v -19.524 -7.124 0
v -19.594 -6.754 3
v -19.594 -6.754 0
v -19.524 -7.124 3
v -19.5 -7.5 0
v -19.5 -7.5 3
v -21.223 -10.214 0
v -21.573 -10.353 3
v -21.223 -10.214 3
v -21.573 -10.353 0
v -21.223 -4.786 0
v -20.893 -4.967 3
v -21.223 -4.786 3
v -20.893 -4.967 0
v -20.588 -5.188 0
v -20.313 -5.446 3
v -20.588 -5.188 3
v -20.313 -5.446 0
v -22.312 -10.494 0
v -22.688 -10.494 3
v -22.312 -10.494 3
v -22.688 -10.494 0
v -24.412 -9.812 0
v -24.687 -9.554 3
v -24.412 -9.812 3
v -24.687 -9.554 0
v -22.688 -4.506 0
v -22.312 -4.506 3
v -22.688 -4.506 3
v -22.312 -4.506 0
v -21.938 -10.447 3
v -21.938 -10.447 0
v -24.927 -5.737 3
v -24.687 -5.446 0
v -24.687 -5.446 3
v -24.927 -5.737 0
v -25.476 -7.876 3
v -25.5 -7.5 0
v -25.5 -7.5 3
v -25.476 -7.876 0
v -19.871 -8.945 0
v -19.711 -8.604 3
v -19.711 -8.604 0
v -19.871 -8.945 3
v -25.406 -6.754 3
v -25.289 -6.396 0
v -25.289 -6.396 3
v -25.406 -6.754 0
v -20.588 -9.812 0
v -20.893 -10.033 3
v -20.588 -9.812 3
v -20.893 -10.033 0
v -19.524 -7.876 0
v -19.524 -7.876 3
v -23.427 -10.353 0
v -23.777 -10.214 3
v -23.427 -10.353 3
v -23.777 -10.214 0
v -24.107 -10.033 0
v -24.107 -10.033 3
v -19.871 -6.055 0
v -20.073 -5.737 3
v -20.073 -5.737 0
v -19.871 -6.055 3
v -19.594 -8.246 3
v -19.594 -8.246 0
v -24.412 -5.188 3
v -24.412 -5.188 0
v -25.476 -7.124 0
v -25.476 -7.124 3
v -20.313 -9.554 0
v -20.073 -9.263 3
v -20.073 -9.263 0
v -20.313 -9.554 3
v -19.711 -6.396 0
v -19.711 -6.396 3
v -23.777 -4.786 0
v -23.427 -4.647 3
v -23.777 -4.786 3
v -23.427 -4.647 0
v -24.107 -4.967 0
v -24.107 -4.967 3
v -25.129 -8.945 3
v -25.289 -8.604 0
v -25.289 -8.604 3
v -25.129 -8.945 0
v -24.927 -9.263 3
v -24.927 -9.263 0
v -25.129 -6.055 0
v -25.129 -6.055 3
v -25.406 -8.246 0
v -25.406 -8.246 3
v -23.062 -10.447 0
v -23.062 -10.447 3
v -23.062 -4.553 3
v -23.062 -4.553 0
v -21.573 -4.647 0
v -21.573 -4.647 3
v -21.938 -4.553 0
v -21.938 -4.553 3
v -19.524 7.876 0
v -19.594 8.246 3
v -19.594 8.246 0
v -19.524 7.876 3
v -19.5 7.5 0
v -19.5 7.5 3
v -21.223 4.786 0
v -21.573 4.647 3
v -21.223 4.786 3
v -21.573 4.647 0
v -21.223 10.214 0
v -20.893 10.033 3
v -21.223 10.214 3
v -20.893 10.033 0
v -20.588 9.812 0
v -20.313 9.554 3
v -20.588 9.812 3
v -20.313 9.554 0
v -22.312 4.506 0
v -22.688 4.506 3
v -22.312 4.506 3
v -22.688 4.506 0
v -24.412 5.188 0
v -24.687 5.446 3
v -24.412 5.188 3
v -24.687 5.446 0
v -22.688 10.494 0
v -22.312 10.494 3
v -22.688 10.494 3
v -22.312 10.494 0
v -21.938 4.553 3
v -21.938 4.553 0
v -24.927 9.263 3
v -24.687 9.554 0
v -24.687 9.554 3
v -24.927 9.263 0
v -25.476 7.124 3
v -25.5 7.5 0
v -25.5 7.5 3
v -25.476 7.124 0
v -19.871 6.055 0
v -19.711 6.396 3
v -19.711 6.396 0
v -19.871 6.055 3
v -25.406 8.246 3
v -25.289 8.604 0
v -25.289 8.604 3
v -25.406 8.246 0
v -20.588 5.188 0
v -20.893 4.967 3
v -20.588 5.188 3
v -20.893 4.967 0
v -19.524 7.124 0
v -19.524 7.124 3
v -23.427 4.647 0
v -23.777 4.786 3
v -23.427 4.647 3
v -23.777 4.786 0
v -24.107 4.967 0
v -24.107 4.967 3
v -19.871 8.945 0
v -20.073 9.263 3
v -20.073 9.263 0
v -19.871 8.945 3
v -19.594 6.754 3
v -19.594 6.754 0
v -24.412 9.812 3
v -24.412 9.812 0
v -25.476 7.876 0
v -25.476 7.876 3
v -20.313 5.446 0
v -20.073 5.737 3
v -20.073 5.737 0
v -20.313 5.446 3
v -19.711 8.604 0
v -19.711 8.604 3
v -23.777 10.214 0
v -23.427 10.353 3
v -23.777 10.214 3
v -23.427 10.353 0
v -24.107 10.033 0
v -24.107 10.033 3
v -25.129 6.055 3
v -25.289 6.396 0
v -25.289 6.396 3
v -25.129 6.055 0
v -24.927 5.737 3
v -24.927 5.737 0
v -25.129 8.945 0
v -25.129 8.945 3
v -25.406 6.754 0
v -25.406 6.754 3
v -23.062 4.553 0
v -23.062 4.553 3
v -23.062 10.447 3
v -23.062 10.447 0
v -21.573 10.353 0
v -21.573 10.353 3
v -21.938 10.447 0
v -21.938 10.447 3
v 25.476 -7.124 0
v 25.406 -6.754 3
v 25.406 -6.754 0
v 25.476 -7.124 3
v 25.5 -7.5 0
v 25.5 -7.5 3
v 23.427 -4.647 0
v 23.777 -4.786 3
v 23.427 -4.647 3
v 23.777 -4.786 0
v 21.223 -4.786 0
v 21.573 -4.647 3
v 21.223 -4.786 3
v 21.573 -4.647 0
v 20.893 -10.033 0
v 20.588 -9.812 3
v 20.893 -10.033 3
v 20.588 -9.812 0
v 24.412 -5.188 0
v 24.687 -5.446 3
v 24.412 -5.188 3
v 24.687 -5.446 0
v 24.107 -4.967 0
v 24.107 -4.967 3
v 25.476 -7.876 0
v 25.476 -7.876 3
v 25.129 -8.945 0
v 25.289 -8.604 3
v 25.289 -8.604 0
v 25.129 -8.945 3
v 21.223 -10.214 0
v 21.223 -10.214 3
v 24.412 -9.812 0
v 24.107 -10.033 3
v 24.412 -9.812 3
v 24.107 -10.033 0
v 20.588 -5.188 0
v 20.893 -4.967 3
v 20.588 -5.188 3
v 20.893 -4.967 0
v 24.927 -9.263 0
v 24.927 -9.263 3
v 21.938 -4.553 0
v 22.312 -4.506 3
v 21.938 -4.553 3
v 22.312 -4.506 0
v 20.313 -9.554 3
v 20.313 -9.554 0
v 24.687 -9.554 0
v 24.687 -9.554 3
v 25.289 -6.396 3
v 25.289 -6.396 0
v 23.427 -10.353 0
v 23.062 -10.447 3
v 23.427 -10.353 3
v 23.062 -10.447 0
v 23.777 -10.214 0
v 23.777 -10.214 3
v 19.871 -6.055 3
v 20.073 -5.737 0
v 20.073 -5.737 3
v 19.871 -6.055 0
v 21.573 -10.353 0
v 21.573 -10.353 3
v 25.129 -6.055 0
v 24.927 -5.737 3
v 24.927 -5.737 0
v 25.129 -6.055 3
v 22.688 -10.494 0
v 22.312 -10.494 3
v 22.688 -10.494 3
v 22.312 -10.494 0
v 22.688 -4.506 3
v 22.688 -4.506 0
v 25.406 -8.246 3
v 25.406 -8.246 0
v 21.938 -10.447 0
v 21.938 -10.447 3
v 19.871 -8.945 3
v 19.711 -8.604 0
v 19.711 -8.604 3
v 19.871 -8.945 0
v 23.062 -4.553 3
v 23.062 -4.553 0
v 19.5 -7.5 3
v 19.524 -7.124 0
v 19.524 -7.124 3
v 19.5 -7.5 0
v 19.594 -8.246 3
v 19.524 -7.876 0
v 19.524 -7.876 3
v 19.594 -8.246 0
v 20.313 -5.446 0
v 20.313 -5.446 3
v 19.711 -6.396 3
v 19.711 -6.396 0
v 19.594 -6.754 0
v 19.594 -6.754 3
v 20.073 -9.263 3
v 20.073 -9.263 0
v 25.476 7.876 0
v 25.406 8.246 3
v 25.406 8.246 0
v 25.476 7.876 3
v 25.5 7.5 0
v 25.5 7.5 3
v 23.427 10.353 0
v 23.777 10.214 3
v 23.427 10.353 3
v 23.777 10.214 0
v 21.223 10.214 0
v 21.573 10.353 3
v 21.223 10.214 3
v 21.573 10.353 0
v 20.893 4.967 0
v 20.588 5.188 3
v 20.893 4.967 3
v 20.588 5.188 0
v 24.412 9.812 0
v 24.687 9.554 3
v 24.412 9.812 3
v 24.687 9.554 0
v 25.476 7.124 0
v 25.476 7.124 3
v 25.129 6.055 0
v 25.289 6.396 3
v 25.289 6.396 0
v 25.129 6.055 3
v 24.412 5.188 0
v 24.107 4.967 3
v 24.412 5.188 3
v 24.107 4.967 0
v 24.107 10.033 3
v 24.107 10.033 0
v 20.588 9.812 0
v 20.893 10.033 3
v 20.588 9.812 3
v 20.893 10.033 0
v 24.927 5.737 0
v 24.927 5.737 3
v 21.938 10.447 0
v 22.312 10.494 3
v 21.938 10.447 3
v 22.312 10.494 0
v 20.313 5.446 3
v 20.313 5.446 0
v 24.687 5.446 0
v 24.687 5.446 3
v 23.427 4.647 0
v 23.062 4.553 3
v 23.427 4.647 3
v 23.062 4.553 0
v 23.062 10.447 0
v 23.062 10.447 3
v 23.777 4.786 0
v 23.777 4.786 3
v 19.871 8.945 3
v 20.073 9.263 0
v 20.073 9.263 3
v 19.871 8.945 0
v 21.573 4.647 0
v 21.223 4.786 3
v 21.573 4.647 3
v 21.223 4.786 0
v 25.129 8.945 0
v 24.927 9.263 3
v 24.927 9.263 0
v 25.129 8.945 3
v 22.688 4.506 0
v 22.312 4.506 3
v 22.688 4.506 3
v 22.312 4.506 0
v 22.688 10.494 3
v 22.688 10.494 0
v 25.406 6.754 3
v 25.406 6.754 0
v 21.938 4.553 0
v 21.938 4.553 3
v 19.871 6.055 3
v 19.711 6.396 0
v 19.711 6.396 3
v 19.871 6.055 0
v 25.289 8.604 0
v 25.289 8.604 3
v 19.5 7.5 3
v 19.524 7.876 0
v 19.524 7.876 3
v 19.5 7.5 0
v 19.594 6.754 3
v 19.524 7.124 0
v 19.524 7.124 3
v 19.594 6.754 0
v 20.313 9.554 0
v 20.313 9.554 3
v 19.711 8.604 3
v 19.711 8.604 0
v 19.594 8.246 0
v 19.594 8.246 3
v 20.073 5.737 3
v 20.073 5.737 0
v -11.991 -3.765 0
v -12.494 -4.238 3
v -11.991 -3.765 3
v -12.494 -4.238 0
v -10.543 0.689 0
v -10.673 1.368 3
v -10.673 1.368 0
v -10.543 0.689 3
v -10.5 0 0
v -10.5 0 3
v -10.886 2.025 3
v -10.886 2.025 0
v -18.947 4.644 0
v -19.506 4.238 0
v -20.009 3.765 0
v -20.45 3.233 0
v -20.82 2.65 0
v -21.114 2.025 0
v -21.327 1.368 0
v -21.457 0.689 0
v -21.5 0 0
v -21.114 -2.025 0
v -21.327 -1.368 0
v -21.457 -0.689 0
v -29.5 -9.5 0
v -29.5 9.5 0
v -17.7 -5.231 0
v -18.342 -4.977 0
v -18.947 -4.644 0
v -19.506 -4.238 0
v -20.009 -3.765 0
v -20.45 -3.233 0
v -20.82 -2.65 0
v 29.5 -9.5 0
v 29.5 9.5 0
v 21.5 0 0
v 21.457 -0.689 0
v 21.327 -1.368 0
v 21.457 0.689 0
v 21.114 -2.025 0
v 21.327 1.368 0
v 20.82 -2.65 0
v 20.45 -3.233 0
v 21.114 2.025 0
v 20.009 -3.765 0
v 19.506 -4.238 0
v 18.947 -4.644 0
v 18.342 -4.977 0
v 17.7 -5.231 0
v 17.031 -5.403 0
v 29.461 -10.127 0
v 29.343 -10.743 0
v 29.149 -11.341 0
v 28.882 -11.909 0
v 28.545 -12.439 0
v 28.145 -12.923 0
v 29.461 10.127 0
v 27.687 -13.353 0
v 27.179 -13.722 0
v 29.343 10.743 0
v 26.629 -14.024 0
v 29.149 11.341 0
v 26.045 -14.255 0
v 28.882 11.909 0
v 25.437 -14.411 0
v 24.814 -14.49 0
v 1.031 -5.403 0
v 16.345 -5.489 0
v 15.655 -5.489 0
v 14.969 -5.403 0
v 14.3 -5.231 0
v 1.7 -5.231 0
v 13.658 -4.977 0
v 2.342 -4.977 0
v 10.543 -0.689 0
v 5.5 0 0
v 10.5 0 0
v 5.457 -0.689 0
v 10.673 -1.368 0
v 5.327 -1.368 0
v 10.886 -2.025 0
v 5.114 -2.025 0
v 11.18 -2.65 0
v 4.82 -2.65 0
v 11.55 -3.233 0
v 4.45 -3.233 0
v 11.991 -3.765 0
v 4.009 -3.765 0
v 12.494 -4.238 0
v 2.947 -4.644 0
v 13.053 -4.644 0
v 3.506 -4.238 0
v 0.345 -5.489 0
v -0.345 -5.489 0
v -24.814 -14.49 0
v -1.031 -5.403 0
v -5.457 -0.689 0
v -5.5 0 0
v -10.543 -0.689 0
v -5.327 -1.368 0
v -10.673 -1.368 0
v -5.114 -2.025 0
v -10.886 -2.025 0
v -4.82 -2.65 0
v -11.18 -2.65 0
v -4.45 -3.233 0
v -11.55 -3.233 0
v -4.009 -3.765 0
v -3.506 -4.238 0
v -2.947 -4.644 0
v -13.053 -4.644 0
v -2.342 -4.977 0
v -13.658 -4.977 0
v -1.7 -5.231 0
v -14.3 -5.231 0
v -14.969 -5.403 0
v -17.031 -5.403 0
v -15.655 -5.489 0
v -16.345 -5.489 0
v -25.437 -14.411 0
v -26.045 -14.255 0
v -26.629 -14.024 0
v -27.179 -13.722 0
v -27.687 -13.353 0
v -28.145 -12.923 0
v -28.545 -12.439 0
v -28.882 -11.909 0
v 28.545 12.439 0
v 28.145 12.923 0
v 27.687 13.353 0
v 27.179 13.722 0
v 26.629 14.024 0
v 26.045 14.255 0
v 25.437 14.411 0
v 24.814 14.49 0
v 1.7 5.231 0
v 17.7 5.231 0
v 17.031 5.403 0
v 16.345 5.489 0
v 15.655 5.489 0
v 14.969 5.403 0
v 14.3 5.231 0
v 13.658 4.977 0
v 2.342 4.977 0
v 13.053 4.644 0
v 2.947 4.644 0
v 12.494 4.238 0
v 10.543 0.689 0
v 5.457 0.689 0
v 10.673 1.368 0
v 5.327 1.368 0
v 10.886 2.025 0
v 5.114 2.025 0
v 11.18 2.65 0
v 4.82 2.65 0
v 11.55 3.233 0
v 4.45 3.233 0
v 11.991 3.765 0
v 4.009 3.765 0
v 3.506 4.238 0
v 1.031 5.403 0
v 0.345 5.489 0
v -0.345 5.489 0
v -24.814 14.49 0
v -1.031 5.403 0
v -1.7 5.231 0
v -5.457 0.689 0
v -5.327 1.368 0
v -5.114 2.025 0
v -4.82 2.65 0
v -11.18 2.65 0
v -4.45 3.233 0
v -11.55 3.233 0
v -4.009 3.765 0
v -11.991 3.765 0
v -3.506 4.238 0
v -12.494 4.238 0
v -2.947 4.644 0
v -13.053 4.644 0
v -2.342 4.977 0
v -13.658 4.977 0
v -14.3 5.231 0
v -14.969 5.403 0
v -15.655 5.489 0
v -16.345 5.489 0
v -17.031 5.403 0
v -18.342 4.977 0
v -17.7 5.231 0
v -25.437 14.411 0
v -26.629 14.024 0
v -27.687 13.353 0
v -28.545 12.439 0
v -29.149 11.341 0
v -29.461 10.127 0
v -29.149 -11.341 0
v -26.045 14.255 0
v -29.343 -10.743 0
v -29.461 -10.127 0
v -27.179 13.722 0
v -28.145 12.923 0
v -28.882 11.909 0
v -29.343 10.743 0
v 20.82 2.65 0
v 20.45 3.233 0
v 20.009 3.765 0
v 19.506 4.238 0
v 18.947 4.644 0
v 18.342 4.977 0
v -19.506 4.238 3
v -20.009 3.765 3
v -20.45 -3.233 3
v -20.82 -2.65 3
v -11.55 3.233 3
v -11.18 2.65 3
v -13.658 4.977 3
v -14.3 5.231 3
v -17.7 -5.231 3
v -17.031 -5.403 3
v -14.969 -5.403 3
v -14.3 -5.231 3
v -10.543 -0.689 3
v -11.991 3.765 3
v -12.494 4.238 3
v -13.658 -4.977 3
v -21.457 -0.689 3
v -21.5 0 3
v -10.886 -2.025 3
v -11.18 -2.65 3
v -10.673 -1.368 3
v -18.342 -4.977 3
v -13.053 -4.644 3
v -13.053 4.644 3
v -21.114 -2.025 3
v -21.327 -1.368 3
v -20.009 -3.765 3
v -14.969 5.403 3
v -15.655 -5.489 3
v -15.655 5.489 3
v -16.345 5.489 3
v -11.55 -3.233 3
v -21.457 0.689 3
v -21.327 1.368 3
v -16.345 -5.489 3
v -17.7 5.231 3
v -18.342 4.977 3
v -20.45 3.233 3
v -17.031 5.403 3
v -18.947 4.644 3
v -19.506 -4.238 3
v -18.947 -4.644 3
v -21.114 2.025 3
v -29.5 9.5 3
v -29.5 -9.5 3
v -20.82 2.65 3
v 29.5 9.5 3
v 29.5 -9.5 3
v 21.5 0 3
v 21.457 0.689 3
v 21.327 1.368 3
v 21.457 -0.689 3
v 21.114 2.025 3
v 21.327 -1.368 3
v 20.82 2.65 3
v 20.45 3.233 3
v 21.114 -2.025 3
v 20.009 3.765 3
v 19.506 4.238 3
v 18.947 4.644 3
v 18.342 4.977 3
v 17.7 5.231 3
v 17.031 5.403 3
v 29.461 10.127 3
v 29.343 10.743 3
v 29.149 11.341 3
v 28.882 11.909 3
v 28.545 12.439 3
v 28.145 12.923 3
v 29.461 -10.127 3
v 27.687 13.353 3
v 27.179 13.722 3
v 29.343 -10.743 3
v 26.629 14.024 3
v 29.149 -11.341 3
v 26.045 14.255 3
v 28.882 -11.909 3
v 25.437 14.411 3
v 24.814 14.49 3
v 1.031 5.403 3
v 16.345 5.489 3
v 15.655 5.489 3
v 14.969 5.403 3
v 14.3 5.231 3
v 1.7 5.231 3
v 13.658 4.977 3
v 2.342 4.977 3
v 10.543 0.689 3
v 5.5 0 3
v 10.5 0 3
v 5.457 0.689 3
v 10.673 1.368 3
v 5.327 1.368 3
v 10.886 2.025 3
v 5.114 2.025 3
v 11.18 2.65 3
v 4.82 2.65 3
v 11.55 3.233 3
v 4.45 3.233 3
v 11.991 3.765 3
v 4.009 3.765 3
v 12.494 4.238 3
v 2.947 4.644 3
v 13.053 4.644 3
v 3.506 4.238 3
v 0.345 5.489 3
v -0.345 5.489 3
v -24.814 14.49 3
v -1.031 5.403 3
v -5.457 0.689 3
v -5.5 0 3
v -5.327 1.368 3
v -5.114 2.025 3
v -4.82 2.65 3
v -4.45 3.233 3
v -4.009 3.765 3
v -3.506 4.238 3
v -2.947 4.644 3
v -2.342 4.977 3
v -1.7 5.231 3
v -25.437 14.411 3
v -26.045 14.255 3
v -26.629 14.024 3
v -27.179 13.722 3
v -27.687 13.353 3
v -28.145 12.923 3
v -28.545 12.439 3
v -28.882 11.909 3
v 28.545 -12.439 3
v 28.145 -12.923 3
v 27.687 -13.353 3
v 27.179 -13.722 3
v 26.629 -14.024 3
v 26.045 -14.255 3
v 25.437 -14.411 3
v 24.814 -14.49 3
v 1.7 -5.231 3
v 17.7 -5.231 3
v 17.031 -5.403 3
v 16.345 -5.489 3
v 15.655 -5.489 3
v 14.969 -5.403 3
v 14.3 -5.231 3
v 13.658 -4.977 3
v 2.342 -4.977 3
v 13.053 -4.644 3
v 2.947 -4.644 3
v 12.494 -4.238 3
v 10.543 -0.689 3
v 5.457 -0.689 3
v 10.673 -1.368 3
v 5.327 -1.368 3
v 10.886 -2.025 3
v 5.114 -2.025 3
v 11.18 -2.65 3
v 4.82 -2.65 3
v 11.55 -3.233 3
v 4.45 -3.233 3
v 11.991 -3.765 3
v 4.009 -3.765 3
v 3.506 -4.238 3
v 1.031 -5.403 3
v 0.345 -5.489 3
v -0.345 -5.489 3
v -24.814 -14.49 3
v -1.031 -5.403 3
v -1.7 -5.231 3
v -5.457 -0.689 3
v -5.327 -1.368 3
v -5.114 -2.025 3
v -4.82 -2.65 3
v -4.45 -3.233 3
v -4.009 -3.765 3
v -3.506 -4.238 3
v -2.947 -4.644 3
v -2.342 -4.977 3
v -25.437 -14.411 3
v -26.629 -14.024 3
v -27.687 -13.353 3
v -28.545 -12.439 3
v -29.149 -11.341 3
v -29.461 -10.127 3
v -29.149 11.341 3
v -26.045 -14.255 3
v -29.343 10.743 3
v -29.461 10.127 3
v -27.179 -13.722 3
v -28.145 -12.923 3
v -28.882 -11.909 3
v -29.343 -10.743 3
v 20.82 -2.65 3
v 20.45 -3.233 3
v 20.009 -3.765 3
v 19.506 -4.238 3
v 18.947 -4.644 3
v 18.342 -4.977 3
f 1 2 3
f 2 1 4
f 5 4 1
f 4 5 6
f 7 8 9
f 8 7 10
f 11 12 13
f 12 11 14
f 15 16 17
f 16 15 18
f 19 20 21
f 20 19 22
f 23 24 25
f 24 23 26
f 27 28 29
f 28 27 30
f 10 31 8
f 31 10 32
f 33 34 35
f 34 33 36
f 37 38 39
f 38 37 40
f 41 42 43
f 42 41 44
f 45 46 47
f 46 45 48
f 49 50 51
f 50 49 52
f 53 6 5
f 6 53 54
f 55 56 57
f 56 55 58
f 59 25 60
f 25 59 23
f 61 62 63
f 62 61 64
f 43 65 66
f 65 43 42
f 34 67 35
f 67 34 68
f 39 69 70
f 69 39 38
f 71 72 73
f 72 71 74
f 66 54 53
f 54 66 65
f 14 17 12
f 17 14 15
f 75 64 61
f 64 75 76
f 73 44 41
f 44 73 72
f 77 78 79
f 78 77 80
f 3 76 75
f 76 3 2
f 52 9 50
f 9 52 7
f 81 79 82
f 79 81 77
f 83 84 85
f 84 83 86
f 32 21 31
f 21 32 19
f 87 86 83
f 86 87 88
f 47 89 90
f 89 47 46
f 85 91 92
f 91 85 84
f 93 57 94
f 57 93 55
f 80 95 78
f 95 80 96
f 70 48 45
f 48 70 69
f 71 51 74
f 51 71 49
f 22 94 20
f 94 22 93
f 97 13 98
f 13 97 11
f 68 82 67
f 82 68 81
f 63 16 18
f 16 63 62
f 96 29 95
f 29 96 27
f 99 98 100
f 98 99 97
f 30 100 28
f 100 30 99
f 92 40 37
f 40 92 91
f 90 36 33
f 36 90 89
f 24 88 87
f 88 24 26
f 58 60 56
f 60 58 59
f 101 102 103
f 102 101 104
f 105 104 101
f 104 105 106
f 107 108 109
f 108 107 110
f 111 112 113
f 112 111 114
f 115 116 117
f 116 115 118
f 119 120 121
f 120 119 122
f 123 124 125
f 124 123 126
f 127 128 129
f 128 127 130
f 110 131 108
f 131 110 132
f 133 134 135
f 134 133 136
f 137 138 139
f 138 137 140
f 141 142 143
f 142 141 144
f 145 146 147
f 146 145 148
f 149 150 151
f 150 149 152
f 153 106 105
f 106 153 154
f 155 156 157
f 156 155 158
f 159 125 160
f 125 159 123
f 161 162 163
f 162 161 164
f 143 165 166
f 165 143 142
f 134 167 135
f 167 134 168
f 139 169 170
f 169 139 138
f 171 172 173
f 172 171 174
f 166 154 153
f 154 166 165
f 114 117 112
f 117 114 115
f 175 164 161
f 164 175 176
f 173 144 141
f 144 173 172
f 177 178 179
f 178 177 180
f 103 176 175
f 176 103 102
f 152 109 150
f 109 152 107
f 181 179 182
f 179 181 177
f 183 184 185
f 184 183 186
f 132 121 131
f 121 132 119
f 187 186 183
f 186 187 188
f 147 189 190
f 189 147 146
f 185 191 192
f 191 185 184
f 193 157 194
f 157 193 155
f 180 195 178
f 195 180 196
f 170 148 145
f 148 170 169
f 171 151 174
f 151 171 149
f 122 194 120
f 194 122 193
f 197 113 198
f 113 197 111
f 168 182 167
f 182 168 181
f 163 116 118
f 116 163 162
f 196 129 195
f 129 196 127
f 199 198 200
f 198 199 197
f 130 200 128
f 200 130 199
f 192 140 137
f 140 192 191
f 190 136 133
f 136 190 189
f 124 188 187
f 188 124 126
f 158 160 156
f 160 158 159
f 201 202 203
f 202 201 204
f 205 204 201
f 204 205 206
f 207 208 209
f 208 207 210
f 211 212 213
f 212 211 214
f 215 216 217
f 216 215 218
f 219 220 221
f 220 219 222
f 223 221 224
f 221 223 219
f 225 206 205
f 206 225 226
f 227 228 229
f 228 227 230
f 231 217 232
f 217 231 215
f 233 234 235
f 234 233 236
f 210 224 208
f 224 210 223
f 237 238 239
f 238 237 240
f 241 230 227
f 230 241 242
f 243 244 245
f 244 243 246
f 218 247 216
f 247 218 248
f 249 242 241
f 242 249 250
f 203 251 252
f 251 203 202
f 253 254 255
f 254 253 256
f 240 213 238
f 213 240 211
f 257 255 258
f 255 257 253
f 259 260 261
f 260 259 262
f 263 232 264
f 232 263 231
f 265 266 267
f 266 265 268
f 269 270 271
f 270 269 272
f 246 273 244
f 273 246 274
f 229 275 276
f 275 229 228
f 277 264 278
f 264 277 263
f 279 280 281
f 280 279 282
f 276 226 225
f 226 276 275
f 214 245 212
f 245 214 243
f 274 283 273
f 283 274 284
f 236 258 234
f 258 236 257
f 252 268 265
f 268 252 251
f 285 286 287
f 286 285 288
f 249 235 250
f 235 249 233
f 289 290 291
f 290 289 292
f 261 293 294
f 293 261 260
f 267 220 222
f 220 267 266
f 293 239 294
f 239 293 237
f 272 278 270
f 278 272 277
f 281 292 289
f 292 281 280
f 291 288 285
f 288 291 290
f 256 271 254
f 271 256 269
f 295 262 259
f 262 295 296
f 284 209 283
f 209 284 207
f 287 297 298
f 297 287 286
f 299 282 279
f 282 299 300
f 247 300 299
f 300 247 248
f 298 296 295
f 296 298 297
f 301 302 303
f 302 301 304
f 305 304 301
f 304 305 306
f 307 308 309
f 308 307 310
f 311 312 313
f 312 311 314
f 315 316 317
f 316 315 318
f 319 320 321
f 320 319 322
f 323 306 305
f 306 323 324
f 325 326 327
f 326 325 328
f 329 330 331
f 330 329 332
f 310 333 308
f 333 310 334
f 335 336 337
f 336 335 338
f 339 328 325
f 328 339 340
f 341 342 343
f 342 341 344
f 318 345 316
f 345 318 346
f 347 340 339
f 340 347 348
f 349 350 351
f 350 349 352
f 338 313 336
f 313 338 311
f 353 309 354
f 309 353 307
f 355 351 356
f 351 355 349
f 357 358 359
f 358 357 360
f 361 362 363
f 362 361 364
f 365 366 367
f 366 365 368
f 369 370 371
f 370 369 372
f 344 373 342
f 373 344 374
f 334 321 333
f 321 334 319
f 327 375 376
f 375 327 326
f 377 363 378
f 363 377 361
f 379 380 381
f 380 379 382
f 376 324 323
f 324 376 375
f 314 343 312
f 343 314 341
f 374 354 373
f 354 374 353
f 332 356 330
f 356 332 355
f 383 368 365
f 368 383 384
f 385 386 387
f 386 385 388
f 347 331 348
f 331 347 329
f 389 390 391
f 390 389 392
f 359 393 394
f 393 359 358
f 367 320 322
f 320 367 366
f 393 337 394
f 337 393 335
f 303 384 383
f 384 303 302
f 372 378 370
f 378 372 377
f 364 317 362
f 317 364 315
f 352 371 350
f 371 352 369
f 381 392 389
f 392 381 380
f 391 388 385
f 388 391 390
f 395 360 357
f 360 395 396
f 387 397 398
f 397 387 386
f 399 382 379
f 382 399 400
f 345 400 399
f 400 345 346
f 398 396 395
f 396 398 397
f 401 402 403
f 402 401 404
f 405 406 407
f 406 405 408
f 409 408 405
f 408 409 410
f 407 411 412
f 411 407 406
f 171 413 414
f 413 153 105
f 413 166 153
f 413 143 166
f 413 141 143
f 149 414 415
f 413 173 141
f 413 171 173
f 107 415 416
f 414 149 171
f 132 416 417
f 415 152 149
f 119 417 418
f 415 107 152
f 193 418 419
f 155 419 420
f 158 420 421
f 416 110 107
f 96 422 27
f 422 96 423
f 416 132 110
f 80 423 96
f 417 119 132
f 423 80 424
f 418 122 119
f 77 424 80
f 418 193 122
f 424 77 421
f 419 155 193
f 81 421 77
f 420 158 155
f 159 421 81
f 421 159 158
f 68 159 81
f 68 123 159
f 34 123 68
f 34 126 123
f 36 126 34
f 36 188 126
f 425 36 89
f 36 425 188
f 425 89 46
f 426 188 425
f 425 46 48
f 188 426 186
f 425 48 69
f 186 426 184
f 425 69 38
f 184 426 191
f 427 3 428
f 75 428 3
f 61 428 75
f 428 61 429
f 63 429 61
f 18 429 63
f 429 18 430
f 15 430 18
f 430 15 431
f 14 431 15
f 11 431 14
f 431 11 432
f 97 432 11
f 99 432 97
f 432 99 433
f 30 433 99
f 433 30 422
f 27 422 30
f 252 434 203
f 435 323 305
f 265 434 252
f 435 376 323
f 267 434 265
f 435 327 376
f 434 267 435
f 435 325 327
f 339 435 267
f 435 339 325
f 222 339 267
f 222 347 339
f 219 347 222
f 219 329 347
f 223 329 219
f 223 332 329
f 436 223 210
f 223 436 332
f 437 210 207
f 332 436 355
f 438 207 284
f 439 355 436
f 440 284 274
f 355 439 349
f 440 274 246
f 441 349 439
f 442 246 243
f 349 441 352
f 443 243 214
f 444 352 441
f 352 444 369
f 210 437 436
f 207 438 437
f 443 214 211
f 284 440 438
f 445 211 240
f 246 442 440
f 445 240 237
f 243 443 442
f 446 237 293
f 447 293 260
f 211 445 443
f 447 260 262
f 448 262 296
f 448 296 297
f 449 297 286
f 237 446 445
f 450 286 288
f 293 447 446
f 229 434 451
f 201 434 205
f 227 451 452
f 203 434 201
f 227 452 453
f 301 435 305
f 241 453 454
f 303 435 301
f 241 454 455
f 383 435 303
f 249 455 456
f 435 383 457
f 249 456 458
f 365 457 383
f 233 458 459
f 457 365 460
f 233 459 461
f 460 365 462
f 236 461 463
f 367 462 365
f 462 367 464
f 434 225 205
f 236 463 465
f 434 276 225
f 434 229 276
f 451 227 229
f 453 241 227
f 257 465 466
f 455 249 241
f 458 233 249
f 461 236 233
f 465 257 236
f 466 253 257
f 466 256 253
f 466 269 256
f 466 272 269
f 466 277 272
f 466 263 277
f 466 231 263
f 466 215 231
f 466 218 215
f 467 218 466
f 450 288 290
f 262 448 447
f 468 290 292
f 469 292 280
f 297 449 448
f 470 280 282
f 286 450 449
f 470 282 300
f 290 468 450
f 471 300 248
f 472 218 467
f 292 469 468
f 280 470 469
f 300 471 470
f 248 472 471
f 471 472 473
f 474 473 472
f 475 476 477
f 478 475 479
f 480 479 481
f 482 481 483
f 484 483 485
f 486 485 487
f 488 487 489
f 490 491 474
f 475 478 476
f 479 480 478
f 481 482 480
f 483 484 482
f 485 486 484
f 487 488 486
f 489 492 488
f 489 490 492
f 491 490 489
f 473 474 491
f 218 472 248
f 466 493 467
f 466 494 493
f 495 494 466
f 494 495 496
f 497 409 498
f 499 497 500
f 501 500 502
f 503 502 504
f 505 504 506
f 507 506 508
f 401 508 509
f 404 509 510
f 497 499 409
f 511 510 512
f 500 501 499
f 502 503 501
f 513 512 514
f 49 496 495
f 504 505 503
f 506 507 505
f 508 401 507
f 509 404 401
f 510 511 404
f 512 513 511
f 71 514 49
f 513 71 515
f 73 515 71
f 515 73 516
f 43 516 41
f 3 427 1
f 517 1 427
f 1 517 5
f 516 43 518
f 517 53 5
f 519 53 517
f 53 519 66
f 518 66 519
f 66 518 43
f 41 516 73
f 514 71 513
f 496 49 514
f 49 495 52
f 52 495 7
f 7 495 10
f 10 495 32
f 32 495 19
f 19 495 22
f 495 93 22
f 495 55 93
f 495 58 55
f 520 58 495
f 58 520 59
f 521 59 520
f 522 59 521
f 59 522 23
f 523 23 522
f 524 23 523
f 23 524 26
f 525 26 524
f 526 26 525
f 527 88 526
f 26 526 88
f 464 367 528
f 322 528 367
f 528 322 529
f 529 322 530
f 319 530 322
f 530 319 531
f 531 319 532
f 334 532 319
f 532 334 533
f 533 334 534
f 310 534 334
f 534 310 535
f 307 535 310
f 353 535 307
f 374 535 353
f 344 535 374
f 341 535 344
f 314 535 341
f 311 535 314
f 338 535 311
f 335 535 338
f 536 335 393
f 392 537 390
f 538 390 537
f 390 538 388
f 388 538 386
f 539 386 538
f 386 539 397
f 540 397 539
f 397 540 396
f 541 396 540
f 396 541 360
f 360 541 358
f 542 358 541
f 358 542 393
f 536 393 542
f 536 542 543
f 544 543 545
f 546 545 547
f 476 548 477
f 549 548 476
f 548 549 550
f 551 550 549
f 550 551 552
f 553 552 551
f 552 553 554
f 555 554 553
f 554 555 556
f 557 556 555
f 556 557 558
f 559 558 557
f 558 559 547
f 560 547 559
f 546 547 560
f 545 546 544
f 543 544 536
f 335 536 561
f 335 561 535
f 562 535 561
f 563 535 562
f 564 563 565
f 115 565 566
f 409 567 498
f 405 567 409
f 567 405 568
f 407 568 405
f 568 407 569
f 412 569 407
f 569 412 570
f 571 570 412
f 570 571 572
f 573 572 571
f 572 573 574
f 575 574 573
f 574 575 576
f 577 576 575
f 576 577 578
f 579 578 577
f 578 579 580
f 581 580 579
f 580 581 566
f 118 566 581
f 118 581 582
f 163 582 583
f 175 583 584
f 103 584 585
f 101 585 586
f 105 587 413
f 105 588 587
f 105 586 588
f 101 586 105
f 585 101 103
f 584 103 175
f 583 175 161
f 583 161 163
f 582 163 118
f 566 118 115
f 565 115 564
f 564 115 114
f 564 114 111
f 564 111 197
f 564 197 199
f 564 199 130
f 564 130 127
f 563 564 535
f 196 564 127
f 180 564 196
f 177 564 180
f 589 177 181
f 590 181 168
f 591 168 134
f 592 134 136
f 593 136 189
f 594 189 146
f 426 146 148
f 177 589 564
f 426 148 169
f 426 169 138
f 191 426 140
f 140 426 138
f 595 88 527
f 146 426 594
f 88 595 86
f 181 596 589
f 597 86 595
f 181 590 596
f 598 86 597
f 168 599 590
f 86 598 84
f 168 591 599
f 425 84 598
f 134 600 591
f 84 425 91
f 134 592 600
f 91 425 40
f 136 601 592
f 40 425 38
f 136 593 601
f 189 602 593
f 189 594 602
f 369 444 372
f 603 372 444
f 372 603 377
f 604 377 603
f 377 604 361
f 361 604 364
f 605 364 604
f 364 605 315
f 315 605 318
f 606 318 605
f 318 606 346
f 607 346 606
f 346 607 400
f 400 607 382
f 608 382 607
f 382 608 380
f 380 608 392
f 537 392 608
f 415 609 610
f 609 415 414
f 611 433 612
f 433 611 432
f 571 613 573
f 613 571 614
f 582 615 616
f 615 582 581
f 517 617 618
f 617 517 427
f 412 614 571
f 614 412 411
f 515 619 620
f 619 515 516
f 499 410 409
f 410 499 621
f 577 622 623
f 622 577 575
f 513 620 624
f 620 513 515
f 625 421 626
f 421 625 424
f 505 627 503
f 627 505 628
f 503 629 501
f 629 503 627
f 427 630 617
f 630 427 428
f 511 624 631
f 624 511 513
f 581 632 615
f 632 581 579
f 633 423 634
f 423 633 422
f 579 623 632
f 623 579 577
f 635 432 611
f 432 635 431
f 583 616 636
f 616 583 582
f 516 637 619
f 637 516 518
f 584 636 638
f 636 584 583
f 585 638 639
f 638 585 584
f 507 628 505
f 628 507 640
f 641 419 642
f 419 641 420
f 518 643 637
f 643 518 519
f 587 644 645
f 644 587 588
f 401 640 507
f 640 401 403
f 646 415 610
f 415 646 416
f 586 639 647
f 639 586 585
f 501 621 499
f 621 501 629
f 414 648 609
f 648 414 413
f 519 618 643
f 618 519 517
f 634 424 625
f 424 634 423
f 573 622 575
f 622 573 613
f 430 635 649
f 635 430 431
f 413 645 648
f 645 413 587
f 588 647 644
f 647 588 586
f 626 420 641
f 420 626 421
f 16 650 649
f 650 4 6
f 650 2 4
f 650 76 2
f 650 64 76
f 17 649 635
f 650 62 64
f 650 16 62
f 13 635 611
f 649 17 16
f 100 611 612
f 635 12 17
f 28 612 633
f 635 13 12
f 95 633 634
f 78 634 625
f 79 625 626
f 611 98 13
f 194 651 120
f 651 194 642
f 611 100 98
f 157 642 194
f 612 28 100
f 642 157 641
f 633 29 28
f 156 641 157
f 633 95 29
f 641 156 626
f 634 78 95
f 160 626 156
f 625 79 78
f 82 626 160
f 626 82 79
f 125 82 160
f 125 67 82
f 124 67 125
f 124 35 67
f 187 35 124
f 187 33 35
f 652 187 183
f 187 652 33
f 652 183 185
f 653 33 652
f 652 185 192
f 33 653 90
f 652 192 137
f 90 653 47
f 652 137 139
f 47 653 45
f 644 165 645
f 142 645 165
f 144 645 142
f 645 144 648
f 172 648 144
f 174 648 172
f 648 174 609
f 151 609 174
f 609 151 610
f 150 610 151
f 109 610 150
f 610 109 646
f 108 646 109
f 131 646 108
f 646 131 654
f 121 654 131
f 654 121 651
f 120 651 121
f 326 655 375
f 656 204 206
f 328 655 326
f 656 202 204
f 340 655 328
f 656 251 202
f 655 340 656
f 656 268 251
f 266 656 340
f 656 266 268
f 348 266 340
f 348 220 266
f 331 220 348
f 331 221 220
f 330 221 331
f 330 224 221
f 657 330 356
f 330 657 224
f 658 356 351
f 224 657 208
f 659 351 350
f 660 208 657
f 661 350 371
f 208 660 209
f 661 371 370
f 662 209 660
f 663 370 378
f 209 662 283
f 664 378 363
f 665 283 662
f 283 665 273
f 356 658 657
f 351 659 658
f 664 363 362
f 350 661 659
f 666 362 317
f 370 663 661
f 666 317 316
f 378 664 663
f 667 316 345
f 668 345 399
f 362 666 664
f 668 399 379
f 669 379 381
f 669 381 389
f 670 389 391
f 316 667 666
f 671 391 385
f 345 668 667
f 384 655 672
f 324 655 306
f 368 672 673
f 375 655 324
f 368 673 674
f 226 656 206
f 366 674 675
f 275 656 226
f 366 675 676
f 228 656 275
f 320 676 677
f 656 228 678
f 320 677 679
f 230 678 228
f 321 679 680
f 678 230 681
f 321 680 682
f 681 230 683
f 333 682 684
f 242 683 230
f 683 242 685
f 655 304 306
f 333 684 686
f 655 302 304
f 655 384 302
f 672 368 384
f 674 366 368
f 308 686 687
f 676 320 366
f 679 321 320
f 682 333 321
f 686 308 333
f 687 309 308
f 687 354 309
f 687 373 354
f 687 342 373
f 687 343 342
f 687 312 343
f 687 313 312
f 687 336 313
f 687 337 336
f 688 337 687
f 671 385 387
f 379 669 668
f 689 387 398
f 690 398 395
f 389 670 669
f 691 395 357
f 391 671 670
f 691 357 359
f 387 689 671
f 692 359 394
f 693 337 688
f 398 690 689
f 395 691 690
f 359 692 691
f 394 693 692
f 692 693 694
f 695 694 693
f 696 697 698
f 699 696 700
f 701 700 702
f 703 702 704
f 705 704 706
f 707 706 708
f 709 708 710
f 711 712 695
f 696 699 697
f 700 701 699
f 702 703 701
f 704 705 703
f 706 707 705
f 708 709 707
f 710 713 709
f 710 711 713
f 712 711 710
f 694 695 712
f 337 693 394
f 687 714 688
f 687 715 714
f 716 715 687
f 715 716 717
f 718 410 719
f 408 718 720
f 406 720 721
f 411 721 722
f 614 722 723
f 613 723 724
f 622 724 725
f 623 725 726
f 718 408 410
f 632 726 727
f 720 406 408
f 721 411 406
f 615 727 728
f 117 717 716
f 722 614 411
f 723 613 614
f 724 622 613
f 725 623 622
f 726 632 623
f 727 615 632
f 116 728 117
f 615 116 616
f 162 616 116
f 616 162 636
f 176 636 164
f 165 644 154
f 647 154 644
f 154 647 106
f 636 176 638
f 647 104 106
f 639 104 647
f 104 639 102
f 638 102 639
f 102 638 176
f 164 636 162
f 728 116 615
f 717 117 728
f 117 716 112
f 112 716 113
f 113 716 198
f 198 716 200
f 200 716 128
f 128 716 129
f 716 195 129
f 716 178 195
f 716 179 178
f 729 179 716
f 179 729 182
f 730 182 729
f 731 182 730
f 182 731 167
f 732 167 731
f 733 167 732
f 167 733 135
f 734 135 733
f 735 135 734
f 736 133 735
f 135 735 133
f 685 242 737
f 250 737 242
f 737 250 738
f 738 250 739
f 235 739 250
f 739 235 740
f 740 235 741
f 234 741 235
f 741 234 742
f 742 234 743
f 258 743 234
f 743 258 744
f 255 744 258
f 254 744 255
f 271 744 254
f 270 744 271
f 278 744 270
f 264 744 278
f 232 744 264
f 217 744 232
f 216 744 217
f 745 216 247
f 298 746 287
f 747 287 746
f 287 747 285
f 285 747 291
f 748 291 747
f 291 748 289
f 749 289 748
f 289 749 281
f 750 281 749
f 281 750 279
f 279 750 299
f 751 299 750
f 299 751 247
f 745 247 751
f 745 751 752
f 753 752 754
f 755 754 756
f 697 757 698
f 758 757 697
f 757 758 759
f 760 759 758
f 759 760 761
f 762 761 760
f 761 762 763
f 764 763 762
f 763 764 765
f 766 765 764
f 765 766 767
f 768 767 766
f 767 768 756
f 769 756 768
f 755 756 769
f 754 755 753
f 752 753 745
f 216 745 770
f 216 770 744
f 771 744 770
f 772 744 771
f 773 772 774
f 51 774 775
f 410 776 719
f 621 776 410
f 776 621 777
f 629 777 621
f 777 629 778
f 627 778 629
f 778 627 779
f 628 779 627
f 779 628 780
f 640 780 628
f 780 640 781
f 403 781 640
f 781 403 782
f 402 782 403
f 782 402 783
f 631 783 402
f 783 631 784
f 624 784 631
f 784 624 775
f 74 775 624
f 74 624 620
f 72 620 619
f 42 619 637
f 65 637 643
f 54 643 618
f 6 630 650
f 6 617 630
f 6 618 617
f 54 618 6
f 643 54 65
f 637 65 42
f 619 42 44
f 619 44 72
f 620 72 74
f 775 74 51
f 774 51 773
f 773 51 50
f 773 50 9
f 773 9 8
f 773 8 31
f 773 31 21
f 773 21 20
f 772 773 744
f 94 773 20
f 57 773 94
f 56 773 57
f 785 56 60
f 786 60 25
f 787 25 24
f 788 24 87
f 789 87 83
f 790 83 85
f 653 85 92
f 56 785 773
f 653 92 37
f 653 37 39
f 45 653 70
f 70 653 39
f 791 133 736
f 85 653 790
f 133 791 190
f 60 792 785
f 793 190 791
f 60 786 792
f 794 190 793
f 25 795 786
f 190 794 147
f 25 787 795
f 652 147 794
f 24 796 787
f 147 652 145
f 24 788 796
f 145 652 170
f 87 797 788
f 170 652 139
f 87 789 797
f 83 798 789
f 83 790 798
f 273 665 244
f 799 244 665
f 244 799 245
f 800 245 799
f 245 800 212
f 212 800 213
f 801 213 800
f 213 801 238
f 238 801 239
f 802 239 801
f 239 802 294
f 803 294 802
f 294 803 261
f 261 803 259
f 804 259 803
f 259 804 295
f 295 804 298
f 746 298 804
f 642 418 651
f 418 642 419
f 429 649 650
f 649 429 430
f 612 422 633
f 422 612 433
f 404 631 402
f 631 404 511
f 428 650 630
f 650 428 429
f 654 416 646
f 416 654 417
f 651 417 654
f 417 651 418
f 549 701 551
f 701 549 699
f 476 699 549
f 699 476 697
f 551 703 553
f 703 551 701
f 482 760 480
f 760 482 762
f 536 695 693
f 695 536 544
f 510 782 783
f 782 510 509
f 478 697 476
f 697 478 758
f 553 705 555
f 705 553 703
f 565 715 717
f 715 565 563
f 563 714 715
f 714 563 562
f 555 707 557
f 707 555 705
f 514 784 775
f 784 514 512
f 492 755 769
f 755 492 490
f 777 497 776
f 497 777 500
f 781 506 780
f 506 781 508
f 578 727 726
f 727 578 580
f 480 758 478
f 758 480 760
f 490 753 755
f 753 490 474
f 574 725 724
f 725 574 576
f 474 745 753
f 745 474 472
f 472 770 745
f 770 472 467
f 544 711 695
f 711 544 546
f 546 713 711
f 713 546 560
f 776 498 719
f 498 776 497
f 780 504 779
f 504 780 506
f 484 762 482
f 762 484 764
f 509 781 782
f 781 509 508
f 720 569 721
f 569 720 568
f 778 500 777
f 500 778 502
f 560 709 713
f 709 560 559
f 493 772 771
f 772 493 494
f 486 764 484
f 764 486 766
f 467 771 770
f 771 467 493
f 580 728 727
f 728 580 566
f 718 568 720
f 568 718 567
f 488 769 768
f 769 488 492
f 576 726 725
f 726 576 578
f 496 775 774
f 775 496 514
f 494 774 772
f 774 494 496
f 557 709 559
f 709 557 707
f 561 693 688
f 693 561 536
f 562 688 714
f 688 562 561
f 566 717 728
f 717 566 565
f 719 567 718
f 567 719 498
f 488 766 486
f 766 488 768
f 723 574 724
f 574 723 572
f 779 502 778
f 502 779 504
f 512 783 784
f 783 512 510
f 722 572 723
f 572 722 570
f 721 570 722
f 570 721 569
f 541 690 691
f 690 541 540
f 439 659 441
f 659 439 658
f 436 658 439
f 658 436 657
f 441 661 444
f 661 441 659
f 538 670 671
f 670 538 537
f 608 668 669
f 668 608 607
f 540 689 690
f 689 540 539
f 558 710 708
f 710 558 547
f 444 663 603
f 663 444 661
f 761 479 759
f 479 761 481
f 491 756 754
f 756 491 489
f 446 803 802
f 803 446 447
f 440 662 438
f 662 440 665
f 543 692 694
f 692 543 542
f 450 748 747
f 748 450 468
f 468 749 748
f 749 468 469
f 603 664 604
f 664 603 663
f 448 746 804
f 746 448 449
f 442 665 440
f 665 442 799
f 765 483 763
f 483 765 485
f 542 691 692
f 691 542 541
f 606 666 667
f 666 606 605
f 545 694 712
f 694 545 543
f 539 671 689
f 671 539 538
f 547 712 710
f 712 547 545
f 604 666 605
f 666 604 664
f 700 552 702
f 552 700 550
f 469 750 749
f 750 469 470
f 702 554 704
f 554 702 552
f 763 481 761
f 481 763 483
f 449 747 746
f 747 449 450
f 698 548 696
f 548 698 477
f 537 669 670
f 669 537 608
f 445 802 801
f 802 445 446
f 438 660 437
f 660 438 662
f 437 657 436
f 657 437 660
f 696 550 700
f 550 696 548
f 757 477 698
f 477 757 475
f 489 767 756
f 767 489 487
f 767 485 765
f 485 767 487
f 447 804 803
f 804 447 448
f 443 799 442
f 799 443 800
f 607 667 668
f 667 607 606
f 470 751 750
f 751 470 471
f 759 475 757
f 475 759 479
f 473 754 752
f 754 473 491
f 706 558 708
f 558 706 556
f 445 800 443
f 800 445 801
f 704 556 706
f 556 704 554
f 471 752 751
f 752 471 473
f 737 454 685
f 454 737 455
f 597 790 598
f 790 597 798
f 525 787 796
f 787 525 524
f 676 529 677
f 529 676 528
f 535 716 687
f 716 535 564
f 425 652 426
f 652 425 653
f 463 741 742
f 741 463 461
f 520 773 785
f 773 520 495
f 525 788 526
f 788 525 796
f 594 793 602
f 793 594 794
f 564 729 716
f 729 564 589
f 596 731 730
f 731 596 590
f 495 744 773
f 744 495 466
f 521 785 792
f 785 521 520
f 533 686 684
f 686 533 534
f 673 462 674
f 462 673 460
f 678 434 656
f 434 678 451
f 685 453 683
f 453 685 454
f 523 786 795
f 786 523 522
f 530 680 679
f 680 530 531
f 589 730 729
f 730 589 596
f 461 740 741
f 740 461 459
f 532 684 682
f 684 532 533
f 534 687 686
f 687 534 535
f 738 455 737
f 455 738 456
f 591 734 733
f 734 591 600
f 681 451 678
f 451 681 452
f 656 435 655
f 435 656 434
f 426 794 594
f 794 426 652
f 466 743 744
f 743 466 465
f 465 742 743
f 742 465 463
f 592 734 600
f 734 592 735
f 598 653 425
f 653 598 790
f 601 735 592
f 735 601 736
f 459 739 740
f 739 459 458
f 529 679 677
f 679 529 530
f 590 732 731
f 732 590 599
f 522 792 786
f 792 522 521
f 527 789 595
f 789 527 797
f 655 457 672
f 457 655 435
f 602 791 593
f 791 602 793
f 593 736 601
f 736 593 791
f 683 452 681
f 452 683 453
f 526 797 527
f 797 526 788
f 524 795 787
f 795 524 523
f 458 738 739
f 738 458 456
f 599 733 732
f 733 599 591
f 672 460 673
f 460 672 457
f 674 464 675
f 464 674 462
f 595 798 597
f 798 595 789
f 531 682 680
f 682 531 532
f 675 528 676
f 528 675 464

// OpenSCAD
$fn = 50;


difference() {
	union() {
		hull() {
			translate(v = [-24.5000000000, 9.5000000000, 0]) {
				cylinder(h = 3, r = 5);
			}
			translate(v = [24.5000000000, 9.5000000000, 0]) {
				cylinder(h = 3, r = 5);
			}
			translate(v = [-24.5000000000, -9.5000000000, 0]) {
				cylinder(h = 3, r = 5);
			}
			translate(v = [24.5000000000, -9.5000000000, 0]) {
				cylinder(h = 3, r = 5);
			}
		}
	}
	union() {
		#translate(v = [-22.5000000000, -7.5000000000, -100.0000000000]) {
			cylinder(h = 200, r = 3.0000000000);
		}
		#translate(v = [-22.5000000000, 7.5000000000, -100.0000000000]) {
			cylinder(h = 200, r = 3.0000000000);
		}
		#translate(v = [22.5000000000, -7.5000000000, -100.0000000000]) {
			cylinder(h = 200, r = 3.0000000000);
		}
		#translate(v = [22.5000000000, 7.5000000000, -100.0000000000]) {
			cylinder(h = 200, r = 3.0000000000);
		}
		#translate(v = [-16.0000000000, 0, 0]) {
			cylinder(h = 3, r = 5.5000000000);
		}
		#cylinder(h = 3, r = 5.5000000000);
		#translate(v = [16.0000000000, 0, 0]) {
			cylinder(h = 3, r = 5.5000000000);
		}
	}
}
